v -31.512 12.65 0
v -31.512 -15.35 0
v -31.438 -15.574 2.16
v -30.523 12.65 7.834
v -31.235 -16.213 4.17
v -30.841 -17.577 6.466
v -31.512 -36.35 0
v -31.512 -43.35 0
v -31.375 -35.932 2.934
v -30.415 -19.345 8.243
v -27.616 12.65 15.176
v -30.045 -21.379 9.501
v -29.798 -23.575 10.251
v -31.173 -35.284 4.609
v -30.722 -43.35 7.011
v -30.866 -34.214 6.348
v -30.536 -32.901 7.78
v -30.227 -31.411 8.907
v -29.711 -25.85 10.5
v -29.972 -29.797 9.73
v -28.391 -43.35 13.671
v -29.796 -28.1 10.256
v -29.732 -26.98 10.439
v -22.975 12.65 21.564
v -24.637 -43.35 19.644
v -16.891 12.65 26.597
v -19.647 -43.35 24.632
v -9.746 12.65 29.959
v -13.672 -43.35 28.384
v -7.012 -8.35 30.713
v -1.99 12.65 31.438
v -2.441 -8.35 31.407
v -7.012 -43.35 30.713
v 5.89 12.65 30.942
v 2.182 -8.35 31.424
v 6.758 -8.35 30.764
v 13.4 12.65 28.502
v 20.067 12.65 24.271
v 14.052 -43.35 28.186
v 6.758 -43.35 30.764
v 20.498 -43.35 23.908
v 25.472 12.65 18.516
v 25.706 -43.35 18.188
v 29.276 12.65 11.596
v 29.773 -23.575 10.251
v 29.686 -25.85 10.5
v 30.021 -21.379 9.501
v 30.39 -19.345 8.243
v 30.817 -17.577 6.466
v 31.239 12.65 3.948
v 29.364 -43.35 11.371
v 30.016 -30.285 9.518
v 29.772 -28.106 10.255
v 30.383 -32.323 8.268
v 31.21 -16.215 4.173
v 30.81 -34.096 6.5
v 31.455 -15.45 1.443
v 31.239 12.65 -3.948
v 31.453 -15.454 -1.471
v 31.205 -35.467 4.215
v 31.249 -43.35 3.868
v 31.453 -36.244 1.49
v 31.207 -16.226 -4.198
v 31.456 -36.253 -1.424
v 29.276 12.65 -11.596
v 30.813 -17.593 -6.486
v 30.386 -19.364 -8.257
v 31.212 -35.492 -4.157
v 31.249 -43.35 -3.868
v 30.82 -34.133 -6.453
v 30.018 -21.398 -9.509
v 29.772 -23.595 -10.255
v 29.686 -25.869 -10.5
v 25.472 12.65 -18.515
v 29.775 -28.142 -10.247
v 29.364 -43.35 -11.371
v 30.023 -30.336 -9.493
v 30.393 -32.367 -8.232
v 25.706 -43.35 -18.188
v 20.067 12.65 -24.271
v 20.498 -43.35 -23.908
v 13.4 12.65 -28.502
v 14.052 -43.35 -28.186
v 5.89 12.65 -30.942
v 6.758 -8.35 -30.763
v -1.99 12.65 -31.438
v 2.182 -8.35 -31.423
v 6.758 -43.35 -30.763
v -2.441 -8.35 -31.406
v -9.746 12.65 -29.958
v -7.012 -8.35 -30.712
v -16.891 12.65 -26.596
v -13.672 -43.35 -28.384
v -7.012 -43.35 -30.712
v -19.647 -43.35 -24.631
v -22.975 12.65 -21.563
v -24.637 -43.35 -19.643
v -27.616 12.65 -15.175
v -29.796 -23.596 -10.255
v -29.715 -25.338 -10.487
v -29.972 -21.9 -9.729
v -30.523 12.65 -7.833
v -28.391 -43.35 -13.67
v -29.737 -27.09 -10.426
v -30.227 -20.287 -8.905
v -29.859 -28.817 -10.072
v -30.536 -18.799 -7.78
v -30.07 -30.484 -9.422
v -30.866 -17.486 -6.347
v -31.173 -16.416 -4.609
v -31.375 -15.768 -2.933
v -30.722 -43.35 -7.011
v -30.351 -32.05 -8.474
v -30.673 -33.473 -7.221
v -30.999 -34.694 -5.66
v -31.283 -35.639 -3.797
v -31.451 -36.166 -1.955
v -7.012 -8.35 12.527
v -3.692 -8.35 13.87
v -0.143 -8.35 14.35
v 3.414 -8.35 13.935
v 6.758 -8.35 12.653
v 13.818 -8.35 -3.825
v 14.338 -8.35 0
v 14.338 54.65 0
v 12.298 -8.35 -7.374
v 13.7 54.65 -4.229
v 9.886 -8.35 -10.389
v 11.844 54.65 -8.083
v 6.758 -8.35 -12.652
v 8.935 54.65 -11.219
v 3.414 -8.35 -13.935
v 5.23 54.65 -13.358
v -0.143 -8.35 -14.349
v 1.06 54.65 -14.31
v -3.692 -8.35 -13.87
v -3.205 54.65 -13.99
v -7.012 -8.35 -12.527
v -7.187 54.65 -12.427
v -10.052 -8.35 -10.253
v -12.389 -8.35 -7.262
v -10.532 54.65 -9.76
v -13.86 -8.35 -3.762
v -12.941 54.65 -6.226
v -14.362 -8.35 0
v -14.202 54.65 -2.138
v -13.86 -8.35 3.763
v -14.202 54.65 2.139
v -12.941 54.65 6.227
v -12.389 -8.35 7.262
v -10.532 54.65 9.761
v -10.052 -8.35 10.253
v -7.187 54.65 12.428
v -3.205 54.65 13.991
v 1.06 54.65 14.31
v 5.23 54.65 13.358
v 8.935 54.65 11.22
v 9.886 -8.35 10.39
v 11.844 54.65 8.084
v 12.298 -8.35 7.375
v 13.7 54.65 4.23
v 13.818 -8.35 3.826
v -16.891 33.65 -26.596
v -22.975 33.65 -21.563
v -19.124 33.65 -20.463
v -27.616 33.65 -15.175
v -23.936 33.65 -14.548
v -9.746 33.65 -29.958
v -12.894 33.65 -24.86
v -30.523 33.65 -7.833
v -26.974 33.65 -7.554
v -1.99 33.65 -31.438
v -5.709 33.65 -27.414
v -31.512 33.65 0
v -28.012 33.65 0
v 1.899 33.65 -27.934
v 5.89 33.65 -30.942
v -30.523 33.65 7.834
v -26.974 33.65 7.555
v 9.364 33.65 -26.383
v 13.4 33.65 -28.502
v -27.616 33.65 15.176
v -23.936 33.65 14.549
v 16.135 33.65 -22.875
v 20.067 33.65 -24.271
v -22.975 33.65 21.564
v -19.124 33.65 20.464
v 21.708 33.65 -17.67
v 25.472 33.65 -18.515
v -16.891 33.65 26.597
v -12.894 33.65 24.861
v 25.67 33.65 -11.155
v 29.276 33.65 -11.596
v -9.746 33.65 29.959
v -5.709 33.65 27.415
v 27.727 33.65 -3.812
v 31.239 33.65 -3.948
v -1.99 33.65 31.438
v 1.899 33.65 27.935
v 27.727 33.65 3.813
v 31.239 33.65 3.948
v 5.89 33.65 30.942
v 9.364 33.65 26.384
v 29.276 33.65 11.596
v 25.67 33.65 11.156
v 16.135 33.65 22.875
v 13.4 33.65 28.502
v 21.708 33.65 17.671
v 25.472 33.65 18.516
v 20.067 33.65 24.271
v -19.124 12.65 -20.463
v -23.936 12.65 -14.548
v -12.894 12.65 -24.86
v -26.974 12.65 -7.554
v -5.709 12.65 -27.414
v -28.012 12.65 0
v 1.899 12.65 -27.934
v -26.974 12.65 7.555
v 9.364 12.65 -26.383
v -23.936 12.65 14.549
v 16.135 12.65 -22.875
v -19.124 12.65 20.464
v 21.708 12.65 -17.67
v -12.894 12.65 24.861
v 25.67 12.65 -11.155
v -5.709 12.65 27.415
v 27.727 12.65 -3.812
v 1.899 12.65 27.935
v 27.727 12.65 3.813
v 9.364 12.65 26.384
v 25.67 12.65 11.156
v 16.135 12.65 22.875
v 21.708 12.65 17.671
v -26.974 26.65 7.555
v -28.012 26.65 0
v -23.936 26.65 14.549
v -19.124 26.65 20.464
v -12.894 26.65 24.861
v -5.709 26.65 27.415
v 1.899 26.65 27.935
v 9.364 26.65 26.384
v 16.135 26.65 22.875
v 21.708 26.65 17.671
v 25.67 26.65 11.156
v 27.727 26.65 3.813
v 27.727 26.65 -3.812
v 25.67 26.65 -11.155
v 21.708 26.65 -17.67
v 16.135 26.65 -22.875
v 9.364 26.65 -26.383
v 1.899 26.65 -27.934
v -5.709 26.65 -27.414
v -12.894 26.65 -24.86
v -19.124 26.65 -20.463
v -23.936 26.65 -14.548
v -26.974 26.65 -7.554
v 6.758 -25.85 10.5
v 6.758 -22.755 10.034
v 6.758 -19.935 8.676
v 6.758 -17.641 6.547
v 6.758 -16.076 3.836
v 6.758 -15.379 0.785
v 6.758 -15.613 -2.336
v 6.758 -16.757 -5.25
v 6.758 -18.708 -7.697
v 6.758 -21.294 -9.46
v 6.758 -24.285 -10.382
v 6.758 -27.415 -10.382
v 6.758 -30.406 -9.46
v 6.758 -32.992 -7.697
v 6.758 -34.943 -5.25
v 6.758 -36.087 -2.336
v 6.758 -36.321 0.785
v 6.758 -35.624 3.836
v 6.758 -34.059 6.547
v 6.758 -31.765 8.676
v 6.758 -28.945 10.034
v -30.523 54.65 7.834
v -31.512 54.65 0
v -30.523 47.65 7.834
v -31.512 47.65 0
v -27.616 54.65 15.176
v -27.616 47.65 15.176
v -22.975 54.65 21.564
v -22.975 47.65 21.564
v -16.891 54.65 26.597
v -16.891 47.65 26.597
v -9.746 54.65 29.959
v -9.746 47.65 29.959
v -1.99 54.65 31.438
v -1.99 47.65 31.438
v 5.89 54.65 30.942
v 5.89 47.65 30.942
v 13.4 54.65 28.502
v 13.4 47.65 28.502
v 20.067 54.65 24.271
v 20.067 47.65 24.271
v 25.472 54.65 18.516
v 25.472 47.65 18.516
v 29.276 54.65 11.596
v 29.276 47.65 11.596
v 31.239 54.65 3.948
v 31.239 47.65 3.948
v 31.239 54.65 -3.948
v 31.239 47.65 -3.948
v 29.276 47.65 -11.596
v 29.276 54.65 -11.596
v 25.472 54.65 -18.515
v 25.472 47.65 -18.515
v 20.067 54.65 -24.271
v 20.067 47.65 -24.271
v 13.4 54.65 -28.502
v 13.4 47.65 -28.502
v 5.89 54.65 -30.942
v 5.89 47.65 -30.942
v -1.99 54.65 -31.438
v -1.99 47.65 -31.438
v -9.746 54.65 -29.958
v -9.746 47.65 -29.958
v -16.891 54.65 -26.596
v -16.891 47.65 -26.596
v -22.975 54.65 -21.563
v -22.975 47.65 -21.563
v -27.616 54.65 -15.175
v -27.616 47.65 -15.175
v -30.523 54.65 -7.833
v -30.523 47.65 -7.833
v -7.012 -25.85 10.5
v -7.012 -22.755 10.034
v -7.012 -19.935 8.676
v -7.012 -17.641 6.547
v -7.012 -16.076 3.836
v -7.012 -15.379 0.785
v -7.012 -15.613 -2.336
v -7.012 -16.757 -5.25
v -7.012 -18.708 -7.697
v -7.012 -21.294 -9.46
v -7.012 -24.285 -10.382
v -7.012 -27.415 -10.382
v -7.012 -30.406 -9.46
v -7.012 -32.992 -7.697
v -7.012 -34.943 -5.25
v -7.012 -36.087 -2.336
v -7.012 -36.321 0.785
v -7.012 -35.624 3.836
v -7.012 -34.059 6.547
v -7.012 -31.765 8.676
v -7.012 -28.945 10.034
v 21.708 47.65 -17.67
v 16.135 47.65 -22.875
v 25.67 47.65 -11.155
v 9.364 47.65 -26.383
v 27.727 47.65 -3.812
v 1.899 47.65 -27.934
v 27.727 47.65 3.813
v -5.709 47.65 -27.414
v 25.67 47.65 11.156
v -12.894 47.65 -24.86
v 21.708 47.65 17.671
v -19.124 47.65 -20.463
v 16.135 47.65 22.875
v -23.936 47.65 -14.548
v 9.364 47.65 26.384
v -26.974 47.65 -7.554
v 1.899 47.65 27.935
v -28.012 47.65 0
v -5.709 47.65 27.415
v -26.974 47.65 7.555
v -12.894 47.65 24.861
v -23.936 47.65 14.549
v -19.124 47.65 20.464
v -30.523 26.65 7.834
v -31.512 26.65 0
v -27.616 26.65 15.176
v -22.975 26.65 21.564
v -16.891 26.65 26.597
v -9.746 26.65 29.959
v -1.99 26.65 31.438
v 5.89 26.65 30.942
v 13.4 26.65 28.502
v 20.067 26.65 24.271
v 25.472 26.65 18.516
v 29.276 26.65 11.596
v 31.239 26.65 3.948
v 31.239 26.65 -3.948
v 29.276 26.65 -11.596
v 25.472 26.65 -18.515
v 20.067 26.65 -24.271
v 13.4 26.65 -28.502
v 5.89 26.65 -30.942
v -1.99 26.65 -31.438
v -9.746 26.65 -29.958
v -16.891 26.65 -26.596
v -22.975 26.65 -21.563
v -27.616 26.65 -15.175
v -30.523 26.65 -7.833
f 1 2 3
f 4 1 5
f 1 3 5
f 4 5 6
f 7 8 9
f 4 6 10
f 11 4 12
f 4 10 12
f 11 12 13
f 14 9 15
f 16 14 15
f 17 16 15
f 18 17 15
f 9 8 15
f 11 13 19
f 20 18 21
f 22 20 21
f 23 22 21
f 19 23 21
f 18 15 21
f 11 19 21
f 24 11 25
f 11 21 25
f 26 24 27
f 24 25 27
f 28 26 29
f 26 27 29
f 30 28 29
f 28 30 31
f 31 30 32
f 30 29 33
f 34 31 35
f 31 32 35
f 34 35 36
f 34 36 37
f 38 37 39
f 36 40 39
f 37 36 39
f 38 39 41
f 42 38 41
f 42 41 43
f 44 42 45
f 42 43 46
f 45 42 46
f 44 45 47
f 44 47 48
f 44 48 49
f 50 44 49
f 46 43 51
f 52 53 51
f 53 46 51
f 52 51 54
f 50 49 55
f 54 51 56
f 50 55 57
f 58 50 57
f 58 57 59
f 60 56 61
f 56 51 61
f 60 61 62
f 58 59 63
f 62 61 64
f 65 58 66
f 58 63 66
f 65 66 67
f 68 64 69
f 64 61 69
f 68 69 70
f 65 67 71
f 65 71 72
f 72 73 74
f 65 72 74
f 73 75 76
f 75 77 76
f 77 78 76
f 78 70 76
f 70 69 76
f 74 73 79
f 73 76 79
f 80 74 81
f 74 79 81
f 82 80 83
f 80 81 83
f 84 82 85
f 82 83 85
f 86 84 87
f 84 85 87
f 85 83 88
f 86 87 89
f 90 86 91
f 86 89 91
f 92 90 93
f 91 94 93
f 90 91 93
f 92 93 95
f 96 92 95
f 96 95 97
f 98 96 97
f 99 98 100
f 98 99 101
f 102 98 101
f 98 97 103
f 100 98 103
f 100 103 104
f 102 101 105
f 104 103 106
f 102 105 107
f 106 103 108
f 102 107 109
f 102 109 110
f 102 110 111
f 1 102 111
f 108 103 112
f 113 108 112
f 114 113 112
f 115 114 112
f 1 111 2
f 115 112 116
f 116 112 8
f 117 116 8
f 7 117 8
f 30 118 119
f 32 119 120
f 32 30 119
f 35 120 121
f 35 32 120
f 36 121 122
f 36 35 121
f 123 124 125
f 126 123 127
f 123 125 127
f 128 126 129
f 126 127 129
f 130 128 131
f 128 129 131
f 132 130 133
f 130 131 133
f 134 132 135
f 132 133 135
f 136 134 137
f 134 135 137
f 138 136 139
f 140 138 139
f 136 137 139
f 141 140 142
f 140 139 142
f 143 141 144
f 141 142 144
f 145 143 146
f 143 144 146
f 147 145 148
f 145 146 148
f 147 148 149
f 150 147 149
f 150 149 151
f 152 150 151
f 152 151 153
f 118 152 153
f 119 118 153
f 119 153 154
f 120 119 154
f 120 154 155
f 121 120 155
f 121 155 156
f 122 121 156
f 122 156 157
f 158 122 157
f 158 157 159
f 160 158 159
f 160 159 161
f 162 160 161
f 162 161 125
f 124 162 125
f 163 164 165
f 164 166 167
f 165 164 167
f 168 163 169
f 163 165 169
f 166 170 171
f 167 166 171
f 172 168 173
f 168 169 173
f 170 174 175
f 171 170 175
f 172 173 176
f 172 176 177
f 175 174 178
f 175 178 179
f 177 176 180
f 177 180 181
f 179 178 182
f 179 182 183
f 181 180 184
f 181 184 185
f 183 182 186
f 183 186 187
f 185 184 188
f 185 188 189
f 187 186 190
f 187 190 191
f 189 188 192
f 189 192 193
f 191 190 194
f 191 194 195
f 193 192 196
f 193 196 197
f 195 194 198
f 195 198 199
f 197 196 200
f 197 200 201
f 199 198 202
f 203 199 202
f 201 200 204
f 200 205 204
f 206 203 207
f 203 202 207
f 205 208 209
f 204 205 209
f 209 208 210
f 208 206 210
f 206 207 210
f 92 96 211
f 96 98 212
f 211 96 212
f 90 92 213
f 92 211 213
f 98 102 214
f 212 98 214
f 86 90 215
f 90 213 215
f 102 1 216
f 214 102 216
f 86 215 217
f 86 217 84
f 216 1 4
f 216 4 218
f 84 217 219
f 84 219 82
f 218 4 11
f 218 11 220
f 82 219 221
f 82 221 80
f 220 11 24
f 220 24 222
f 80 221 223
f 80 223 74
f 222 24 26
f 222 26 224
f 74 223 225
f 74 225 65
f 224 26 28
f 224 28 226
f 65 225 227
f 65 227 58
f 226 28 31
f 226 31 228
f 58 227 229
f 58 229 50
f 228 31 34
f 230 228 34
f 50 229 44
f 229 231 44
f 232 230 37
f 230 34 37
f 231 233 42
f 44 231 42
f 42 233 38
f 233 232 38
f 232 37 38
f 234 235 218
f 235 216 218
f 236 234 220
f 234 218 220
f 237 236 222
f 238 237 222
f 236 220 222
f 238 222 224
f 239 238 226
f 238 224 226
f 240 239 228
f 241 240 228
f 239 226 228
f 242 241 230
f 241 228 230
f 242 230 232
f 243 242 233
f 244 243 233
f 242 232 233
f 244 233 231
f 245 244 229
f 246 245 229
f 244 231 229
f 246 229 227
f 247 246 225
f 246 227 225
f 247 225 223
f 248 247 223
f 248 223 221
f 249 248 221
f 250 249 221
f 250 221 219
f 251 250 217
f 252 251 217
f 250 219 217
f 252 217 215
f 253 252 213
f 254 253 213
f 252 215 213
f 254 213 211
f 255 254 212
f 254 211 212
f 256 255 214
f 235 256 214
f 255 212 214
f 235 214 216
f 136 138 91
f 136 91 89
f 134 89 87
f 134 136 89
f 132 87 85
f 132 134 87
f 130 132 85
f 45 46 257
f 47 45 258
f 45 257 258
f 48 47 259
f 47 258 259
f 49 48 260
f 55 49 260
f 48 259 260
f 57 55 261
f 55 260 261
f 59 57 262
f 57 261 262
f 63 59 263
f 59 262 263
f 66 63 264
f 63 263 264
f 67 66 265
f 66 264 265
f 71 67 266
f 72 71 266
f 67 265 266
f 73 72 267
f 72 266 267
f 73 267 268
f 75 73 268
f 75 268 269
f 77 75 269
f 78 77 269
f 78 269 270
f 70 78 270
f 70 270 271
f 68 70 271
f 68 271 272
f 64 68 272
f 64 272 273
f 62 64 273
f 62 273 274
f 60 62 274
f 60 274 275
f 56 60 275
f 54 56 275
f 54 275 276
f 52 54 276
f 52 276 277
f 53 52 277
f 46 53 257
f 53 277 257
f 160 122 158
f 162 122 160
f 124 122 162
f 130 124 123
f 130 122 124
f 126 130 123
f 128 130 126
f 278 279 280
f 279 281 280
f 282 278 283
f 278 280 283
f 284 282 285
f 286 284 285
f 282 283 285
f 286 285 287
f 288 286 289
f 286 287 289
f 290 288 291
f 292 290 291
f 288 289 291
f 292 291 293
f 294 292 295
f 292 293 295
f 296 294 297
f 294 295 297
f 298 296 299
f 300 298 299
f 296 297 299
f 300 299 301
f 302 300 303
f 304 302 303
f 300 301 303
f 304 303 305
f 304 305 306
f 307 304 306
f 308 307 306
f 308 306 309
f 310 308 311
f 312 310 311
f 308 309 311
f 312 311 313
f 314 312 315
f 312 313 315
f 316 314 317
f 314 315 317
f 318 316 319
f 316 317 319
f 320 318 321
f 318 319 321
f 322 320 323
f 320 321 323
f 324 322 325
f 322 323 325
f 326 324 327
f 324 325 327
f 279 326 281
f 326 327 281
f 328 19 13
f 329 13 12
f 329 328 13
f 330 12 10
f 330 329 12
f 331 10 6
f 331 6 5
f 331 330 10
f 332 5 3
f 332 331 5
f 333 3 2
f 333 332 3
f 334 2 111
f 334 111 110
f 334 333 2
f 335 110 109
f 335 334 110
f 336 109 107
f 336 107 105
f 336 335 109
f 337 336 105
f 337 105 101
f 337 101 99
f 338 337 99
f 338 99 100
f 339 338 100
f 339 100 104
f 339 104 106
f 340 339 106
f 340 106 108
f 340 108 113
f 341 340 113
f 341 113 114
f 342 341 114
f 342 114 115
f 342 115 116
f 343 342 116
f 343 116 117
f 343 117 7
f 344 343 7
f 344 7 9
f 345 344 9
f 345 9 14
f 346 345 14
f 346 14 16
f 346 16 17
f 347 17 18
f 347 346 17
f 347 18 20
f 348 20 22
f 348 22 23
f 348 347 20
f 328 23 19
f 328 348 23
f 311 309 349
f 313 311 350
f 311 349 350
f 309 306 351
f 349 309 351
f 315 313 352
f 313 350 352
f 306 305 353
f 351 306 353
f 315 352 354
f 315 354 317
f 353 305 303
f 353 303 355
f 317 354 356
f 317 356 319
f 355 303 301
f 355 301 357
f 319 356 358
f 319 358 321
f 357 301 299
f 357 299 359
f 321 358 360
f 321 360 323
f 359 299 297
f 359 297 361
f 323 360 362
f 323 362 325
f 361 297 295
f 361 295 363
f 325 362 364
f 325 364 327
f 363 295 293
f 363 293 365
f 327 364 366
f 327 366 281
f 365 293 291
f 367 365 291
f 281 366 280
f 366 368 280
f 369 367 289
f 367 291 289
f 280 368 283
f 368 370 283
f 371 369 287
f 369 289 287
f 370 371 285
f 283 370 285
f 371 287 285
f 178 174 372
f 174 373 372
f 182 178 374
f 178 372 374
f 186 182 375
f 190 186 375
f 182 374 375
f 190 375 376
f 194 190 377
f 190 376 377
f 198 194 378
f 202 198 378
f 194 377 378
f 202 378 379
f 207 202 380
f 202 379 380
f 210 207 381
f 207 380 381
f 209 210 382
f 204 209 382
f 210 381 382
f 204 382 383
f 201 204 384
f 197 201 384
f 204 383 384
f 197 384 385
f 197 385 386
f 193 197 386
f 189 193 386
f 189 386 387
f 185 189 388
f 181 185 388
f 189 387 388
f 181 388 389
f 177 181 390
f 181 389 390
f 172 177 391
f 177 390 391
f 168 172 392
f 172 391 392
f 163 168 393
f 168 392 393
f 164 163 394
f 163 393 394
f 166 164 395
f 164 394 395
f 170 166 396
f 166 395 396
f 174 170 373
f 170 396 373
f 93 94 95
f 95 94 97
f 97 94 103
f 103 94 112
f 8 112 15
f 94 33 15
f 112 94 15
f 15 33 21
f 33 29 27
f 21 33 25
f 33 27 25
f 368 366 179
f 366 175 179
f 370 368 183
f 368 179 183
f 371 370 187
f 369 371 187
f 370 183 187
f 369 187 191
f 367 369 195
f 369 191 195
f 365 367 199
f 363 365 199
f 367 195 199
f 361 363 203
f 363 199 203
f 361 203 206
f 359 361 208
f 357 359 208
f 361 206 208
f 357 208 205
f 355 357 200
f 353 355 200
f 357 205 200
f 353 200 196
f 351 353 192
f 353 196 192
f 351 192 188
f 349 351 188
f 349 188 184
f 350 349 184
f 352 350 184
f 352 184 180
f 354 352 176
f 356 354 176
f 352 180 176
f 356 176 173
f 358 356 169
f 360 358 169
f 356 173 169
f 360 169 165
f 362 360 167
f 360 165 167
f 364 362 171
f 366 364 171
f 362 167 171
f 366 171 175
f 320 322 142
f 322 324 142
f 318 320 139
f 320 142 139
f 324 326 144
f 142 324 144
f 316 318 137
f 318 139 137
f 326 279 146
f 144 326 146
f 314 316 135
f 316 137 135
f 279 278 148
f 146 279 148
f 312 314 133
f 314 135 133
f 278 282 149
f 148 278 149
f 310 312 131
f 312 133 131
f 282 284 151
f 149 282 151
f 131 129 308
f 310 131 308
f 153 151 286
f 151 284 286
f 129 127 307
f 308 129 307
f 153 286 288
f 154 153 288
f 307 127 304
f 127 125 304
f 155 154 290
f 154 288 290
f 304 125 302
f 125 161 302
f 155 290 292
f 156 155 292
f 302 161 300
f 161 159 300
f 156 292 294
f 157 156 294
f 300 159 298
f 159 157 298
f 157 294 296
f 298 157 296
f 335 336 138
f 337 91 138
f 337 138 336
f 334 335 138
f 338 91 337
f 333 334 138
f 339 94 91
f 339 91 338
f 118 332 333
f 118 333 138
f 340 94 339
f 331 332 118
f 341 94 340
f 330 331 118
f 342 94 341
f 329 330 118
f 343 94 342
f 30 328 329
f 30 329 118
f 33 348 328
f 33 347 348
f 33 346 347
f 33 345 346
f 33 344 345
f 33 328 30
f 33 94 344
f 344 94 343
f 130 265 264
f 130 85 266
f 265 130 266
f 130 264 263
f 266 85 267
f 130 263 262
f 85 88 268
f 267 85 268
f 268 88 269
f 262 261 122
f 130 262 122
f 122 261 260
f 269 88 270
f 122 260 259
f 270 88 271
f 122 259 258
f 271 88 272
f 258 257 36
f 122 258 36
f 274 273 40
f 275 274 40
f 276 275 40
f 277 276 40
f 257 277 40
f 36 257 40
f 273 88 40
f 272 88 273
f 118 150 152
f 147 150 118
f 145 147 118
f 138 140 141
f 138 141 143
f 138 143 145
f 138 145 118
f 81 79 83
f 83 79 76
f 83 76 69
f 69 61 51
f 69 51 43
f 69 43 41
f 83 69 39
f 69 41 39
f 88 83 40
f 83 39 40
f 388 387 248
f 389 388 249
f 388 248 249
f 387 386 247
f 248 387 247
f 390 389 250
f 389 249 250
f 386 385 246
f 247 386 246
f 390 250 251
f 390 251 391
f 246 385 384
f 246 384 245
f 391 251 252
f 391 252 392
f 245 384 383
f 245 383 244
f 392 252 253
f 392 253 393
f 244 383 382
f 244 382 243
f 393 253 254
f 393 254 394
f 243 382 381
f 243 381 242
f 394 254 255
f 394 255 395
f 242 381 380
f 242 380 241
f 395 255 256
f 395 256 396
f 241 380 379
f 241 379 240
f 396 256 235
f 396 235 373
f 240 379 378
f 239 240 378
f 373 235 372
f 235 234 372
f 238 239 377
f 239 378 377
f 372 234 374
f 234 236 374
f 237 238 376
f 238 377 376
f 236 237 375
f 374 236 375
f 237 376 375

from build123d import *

# Parameters (mm, degrees)
CROQUIS3_W                 = 1.967221418
CROQUIS3_H                 = 9
CORTAR_EXTRUIR1_DEPTH      = 5
CROQUIS4_R                 = 2.05
CORTAR_EXTRUIR2_DEPTH      = 9
CROQUIS7_R                 = 1.5
CORTAR_EXTRUIR3_DEPTH      = 6.467221418
CORTAR_EXTRUIR3_DEPTH_BACK = 4.532778582
ESCALA1_SCALE              = 7


with BuildPart() as part:
    # Croquis2 → Revolución4 (revolve)
    with BuildSketch(Plane.XY):
        Polygon((0, 14), (-4.5, 14), (-4.5, 13), (-4, 13), (-4, 11), (-4.5, 11), (-4.5, 10), (-4, 10), (-4, 8), (-4.5, 8), (-4.5, 0), (0, 0), align=None)
    revolve(axis=Axis((0, 0, 0), (0, 1, 0)))

    # Croquis3 → Cortar-Extruir1 (cut)
    with BuildSketch(Plane.XZ):
        with Locations((-0.016389291, 0)):
            Rectangle(CROQUIS3_W, CROQUIS3_H)
    extrude(amount=-CORTAR_EXTRUIR1_DEPTH, mode=Mode.SUBTRACT)

    # Croquis4 → Cortar-Extruir2 (cut)
    with BuildSketch(Plane(origin=(0, 14, 0), x_dir=(1, 0, 0), z_dir=(0, 1, 0))):
        Circle(CROQUIS4_R)
    extrude(amount=-CORTAR_EXTRUIR2_DEPTH, mode=Mode.SUBTRACT)

    # Croquis7 → Cortar-Extruir3 (cut, two sides)
    with BuildSketch(Plane.ZY.offset(-0.967221418)) as cortar_extruir3_sk:
        with Locations((0, 2.5)):
            Circle(CROQUIS7_R)
    extrude(amount=CORTAR_EXTRUIR3_DEPTH, mode=Mode.SUBTRACT)
    extrude(cortar_extruir3_sk.sketch, amount=-CORTAR_EXTRUIR3_DEPTH_BACK, mode=Mode.SUBTRACT)


with BuildPart() as part_1:
    # Escala1: scaled about (0.00203743, 7.224994078, -4.8862e-05)
    add(part.part.scale(ESCALA1_SCALE).moved(Location((-0.01222458, -43.349964468, 0.000293172))))


solid = part_1.part
